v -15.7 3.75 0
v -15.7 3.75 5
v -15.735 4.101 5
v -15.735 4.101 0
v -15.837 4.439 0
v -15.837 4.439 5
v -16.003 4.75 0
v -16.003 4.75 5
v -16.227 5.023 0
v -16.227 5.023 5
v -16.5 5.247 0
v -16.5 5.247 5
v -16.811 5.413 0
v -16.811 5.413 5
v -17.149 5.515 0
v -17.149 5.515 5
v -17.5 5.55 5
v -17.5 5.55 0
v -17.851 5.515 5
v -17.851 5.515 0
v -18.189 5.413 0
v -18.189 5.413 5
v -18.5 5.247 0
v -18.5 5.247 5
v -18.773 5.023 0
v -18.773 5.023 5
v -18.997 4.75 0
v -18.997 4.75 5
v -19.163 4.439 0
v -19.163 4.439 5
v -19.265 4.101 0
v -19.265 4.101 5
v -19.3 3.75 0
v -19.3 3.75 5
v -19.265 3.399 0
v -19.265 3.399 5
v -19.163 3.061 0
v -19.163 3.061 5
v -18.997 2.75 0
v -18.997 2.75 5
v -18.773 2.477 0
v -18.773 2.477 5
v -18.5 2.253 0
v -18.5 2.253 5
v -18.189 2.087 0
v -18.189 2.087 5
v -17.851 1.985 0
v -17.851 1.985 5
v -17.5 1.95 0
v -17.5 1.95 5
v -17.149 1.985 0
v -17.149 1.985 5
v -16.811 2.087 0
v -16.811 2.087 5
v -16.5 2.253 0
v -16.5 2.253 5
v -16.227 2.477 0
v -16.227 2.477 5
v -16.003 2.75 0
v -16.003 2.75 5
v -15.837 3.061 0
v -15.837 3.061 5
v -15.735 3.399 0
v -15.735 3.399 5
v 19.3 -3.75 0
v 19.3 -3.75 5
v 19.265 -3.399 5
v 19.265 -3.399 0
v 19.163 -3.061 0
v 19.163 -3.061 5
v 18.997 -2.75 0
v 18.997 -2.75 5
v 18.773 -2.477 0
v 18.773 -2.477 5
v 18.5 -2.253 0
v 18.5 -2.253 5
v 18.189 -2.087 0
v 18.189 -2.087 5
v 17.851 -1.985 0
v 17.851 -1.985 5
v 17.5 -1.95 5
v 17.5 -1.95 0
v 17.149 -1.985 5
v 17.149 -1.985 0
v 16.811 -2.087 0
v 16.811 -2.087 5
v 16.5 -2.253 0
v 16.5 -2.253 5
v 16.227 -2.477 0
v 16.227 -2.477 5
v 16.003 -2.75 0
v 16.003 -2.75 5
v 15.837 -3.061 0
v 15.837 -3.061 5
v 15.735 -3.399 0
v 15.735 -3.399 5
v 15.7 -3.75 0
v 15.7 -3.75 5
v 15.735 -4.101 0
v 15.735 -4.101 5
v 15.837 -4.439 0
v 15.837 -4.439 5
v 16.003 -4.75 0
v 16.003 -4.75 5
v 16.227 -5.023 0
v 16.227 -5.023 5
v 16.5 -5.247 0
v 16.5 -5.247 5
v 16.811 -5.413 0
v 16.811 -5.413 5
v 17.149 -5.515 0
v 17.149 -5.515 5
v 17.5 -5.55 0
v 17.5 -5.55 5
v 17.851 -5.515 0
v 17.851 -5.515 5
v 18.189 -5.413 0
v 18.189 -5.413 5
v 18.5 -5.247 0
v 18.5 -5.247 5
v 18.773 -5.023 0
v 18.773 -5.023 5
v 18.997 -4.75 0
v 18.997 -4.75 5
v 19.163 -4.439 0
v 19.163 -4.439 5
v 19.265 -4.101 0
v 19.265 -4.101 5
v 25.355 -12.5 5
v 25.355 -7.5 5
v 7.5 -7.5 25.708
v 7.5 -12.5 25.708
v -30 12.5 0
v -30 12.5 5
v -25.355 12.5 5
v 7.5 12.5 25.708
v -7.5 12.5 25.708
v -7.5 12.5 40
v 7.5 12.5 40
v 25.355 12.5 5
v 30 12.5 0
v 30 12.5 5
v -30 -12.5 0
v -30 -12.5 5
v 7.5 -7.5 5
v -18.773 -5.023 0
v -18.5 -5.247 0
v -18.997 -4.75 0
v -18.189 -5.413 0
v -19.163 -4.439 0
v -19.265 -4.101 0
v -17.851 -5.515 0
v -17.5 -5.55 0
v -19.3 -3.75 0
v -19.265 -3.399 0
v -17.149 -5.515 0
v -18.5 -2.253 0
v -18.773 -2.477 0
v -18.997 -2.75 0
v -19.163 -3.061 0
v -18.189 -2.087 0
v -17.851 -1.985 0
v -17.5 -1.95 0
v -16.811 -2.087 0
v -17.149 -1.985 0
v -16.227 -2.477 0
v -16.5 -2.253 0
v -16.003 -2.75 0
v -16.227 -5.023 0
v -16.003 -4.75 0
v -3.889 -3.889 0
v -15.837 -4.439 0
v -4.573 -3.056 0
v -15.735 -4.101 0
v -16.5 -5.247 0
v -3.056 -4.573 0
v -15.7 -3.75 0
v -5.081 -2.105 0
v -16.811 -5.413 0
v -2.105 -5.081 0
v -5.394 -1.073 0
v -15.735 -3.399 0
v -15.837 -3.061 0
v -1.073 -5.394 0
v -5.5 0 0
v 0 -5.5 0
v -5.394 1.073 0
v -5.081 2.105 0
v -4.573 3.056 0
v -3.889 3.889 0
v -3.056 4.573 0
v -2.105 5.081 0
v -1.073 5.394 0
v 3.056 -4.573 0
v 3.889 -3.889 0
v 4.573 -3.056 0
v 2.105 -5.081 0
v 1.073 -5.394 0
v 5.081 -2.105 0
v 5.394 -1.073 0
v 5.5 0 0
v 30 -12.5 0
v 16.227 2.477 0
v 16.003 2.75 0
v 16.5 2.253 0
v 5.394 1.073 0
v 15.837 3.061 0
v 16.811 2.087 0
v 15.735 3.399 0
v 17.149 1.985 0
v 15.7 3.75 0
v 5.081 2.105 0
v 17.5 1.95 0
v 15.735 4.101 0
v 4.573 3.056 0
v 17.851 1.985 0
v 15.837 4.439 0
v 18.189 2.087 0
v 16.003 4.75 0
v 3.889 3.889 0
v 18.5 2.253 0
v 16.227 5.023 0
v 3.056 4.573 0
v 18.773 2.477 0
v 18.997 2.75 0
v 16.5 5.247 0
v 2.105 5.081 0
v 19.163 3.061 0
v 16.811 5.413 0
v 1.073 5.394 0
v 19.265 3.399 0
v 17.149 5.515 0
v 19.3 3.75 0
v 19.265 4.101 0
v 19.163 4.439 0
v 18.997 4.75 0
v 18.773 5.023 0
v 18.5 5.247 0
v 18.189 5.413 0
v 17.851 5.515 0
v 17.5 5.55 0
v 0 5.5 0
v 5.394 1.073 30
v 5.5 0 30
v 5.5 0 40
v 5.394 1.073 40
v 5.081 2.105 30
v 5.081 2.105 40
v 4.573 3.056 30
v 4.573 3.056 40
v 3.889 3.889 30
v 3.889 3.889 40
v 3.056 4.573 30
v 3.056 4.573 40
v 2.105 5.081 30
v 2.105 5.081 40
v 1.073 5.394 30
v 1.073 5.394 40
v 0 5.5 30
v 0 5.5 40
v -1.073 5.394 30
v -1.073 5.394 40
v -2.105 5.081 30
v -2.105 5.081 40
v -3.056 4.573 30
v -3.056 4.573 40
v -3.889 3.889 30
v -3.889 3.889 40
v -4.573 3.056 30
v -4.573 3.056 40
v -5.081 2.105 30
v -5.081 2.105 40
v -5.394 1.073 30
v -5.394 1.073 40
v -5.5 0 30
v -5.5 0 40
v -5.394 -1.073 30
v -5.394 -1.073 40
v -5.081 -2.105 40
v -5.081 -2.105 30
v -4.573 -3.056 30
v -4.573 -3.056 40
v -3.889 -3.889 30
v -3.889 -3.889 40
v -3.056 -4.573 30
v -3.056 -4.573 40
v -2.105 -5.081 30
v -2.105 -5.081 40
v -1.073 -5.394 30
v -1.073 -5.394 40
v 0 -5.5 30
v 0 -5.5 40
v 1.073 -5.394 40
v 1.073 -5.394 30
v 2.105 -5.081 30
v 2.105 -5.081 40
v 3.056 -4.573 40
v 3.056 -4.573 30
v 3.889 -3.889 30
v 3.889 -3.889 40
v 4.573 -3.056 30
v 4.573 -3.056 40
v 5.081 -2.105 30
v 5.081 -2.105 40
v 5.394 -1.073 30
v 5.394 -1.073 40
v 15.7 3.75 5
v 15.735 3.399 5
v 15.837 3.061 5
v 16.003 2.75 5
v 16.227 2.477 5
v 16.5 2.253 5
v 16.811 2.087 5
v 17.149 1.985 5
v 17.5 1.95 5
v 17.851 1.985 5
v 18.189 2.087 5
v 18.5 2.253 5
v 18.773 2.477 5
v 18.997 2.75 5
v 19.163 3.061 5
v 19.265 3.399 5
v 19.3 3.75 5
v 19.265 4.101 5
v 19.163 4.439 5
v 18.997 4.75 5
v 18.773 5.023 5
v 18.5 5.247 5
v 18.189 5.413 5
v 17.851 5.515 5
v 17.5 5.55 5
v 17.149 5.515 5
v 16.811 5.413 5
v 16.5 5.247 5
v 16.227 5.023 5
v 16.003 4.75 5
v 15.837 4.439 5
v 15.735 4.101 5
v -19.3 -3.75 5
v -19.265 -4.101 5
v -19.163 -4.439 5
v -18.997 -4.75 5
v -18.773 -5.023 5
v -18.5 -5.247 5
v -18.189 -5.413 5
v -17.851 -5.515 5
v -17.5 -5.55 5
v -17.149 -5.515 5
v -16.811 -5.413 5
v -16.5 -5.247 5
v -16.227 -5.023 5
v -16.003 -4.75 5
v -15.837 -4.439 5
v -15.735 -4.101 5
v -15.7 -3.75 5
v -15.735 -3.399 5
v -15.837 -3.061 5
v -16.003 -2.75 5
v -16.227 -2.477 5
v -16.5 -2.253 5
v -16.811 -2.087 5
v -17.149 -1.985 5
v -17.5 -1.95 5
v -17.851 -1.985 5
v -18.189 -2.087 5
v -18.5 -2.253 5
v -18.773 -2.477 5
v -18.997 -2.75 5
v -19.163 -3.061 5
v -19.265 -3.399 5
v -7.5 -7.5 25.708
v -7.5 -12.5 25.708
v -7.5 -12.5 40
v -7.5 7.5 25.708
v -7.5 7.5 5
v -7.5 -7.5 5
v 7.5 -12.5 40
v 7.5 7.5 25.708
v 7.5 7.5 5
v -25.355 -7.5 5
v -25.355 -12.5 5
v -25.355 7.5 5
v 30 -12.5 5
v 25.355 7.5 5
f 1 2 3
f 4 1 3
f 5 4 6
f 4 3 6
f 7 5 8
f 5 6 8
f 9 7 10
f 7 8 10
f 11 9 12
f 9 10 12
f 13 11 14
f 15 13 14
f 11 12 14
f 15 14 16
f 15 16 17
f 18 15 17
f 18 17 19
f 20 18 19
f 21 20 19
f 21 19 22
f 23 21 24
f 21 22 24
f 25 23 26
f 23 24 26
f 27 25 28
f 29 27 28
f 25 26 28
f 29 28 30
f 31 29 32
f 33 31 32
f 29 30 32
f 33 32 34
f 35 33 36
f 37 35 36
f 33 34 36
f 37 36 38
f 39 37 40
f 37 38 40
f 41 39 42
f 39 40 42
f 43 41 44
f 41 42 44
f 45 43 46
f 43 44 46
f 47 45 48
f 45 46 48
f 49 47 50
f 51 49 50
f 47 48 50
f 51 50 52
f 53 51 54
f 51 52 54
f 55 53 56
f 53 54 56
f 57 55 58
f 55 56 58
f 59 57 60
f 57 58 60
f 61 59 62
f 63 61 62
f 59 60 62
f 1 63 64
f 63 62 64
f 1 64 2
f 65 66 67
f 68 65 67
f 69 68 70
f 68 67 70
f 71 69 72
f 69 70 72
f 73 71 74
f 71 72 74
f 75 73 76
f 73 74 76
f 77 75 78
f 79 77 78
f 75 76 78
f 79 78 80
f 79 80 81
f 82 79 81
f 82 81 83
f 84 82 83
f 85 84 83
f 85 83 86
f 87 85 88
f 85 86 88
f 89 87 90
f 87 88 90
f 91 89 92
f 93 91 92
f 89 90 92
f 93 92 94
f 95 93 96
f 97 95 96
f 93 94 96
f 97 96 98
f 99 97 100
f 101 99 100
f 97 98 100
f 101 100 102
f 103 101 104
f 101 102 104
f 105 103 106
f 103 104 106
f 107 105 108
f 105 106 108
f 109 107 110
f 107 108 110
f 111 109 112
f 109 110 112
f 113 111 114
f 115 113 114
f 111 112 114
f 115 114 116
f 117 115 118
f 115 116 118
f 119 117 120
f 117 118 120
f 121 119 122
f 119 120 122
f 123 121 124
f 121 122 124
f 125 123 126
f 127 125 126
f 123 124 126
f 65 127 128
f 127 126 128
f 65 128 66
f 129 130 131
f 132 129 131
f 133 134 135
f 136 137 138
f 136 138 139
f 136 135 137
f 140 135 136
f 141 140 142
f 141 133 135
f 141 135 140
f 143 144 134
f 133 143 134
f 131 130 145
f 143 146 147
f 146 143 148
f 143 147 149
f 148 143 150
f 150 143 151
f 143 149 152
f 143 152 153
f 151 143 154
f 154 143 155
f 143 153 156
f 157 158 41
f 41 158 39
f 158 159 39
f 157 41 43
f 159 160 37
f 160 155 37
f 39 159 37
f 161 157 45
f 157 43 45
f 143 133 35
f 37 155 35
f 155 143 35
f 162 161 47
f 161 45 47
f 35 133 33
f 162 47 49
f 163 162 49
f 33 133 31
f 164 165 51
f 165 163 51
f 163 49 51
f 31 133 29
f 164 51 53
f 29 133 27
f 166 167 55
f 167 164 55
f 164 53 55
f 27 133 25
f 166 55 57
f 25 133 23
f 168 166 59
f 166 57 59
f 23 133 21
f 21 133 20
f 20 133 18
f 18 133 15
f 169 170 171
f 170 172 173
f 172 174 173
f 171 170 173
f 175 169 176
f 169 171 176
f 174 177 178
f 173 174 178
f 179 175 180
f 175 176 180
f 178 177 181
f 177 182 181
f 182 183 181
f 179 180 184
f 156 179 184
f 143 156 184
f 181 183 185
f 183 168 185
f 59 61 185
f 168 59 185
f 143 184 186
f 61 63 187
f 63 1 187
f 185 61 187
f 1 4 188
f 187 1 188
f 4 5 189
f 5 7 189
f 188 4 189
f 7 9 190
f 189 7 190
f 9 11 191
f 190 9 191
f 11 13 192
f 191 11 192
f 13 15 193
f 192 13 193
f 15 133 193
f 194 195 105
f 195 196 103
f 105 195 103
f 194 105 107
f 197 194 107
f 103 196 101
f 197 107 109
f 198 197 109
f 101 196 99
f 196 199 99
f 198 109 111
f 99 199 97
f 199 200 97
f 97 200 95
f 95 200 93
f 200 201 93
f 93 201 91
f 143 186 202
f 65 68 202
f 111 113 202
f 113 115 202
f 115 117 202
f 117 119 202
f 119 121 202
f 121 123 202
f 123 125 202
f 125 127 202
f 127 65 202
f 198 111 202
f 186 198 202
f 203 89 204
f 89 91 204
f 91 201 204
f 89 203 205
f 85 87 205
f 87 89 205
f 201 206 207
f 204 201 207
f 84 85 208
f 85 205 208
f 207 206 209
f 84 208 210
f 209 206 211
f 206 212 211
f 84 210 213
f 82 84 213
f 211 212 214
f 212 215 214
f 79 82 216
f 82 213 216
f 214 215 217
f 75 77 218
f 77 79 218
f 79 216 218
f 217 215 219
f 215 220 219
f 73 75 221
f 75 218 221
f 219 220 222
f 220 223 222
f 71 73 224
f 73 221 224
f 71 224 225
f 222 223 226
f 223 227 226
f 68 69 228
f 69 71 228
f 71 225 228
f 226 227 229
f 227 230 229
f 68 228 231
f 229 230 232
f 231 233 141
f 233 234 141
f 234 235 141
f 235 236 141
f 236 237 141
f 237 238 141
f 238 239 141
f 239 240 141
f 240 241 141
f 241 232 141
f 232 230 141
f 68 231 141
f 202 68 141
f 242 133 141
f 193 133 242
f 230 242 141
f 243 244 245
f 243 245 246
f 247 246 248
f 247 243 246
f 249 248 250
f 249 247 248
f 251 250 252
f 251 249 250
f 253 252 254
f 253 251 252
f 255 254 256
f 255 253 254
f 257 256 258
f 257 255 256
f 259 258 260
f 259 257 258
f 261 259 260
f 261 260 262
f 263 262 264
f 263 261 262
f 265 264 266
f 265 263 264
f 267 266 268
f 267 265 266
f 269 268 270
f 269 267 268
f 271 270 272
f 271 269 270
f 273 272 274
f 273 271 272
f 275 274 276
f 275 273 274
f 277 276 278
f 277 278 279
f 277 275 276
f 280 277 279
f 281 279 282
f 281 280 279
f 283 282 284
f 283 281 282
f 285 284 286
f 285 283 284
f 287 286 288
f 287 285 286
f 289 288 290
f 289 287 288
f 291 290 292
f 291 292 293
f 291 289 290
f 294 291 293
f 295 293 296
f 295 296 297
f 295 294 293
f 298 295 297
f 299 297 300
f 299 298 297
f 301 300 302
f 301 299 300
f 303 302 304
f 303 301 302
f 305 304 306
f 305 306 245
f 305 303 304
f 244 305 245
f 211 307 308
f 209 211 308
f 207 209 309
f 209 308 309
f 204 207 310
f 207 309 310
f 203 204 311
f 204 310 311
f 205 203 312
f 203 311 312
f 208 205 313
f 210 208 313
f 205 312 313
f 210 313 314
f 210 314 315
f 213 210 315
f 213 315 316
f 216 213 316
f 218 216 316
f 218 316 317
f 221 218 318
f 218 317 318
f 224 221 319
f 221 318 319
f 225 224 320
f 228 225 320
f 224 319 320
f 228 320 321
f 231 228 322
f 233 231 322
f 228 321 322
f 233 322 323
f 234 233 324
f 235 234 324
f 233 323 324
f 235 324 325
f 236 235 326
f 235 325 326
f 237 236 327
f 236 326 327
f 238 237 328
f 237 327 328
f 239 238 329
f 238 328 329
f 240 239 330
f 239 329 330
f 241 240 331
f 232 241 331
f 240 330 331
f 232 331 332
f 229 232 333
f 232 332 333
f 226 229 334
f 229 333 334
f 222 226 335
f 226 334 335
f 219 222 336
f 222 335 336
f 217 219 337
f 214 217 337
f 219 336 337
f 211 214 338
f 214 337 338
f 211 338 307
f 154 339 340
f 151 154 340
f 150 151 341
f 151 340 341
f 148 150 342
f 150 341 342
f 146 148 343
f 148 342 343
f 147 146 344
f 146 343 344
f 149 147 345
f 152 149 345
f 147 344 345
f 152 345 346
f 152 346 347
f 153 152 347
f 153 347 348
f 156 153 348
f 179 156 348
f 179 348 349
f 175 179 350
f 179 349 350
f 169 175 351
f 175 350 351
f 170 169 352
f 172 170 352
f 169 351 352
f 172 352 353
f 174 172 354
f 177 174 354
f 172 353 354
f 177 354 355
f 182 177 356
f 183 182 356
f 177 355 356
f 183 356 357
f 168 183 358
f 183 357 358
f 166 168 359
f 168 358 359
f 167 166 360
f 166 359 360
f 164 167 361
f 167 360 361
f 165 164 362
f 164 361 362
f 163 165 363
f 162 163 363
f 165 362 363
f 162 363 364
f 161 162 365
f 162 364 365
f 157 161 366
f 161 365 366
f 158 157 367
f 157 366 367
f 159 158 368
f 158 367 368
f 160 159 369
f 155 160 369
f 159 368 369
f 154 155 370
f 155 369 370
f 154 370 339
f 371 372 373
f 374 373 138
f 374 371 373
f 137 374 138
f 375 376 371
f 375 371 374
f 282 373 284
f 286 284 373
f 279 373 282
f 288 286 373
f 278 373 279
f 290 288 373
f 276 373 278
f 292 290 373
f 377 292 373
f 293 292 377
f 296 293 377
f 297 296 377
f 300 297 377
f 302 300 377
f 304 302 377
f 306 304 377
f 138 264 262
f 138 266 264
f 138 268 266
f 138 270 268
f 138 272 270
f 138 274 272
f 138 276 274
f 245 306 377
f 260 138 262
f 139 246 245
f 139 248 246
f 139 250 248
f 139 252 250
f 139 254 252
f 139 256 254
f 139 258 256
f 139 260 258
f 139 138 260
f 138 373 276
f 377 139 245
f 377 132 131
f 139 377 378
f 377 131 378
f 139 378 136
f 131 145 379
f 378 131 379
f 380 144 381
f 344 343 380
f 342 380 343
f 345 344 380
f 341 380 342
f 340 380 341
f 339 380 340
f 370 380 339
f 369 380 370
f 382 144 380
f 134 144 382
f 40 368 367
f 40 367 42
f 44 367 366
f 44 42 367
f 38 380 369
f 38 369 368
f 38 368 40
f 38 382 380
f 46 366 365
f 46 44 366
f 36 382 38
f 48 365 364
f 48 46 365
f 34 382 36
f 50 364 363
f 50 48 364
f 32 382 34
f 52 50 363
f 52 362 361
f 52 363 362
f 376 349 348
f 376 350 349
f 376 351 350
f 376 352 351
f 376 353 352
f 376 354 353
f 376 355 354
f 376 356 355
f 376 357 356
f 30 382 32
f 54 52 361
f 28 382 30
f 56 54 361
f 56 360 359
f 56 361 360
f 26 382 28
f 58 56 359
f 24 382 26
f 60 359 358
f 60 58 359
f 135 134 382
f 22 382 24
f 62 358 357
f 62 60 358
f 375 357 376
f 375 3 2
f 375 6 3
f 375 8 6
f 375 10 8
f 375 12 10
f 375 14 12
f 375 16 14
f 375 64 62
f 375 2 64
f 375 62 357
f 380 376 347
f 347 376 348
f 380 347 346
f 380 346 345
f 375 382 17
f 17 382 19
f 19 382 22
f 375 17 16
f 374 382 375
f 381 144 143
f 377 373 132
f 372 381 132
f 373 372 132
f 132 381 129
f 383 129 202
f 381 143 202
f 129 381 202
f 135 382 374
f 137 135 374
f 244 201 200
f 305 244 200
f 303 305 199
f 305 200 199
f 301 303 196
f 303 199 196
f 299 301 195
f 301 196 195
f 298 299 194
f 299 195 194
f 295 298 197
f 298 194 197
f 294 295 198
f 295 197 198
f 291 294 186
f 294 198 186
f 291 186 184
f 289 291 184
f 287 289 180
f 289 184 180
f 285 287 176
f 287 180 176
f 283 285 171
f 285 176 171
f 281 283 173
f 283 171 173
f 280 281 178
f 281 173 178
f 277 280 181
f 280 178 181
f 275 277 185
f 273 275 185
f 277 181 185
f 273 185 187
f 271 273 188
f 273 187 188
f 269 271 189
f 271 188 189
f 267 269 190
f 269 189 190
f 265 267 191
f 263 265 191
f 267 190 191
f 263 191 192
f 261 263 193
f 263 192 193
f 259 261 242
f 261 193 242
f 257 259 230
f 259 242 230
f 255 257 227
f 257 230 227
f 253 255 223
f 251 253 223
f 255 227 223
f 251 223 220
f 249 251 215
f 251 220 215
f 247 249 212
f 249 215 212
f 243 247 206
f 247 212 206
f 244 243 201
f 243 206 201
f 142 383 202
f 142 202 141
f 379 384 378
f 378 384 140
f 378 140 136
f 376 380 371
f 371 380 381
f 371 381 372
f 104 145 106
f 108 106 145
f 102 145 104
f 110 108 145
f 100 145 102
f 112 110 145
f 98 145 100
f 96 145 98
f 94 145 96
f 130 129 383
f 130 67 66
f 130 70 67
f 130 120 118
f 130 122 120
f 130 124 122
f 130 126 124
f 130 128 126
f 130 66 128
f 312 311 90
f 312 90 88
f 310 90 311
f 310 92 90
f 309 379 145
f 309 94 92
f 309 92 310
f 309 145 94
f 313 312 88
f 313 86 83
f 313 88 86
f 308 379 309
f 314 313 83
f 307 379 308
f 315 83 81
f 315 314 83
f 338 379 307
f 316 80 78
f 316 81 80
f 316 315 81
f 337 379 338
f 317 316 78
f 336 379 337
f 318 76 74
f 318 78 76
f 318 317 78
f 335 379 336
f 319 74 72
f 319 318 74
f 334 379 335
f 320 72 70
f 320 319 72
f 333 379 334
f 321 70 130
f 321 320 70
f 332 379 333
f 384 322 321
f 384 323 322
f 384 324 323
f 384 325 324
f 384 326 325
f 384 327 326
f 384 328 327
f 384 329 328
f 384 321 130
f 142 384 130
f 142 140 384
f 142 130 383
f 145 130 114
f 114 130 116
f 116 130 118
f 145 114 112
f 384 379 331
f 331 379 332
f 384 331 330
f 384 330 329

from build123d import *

# Parameters (mm, degrees)
SKETCH_1_W               = 40
SKETCH_1_H               = 15
EXTRUDE_1_DEPTH          = 5
SKETCH_2_R               = 5.5
SKETCH_2_R_2             = 1.8
CUT_EXTRUDE_1_DEPTH      = 5
SKETCH_3_W               = 15
SKETCH_3_H               = 15
SKETCH_3_R               = 5.05
EXTRUDE_2_DEPTH          = 25
SKETCH_4_R               = 5.5
CUT_EXTRUDE_2_DEPTH      = 31
SKETCH_5_W               = 10
SKETCH_5_H               = 15
EXTRUDE_3_DEPTH          = 5
SKETCH_6_R               = 1.8
CUT_EXTRUDE_3_DEPTH      = 5
SKETCH_7_W               = 60
SKETCH_7_H               = 5
EXTRUDE_4_DEPTH          = 5
SKETCH_8_W               = 15
SKETCH_8_H               = 5
EXTRUDE_5_DEPTH          = 25
RIB_1_REACH              = 51.244
SKETCH_9_WALL_W          = 127.83111072
SKETCH_9_WALL_H          = 5
MIRROR_2_COPY_1_REACH    = 51.244
MIRROR_2_COPY_1_SKETCH_W = 127.83111072
MIRROR_2_COPY_1_SKETCH_H = 5
SKETCH_11_R              = 1.8
EXTRUDE_6_DEPTH          = 5
SKETCH_12_R              = 1.8
CUT_EXTRUDE_4_DEPTH      = 5
SKETCH_13_W              = 15
SKETCH_13_H              = 25
SKETCH_13_R              = 5.5
EXTRUDE_7_DEPTH          = 10


with BuildPart() as part:
    # 草图1 → 凸台-拉伸1 (new body)
    with BuildSketch(Plane.XY):
        Rectangle(SKETCH_1_W, SKETCH_1_H)
    extrude(amount=EXTRUDE_1_DEPTH)

    # 草图2 → 切除-拉伸1 (cut)
    with BuildSketch(Plane.XY.offset(5)):
        Circle(SKETCH_2_R)
        with Locations((-12, 0)):
            Circle(SKETCH_2_R_2)
        with Locations(Location((12, 0, 0), (0, 0, 180))):
            Circle(SKETCH_2_R_2)
    extrude(amount=-CUT_EXTRUDE_1_DEPTH, mode=Mode.SUBTRACT)

    # 草图3 → 凸台-拉伸2 (add)
    with BuildSketch(Plane.XY.offset(5)):
        Rectangle(SKETCH_3_W, SKETCH_3_H)
        Circle(SKETCH_3_R, mode=Mode.SUBTRACT)
    extrude(amount=EXTRUDE_2_DEPTH)

    # 草图4 → 切除-拉伸2 (cut)
    with BuildSketch(Plane(origin=(0, 0, 5), x_dir=(-1, 0, 0), z_dir=(0, 0, -1))):
        with Locations(Location((0, 0, 0), (0, 0, 180))):
            Circle(SKETCH_4_R)
    extrude(amount=-CUT_EXTRUDE_2_DEPTH, mode=Mode.SUBTRACT)

    # 草图5 → 凸台-拉伸3 (add)
    with BuildSketch(Plane.XY.offset(5)):
        with Locations((-25, 0)):
            Rectangle(SKETCH_5_W, SKETCH_5_H)
        with Locations((25, 0)):
            Rectangle(SKETCH_5_W, SKETCH_5_H)
    extrude(amount=-EXTRUDE_3_DEPTH)

    # 草图6 → 切除-拉伸3 (cut)
    with BuildSketch(Plane.XY.offset(5)):
        with Locations((-24, 0)):
            Circle(SKETCH_6_R)
        with Locations(Location((24, 0, 0), (0, 0, 180))):
            Circle(SKETCH_6_R)
    extrude(amount=-CUT_EXTRUDE_3_DEPTH, mode=Mode.SUBTRACT)

    # 草图7 → 凸台-拉伸4 (add)
    with BuildSketch(Plane.XY.offset(5)):
        with Locations((0, 10)):
            Rectangle(SKETCH_7_W, SKETCH_7_H)
        with Locations((0, -10)):
            Rectangle(SKETCH_7_W, SKETCH_7_H)
    extrude(amount=-EXTRUDE_4_DEPTH)

    # 草图8 → 凸台-拉伸5 (add)
    with BuildSketch(Plane.XY.offset(5)):
        with Locations((0, 10)):
            Rectangle(SKETCH_8_W, SKETCH_8_H)
        with Locations((0, -10)):
            Rectangle(SKETCH_8_W, SKETCH_8_H)
    extrude(amount=EXTRUDE_5_DEPTH)

    # 草图9 wall → 筋1 (add, up to next)
    with BuildSketch(Plane(origin=(-16.427615827, 12.5, 15.353801199), x_dir=(0.653020400469, 0, 0.75734031754), z_dir=(0.75734031754, 0, -0.653020400469)), mode=Mode.PRIVATE) as rib_1_sk1:
        with Locations((0, 2.5)):
            Rectangle(SKETCH_9_WALL_W, SKETCH_9_WALL_H)
    rib_1_tool1 = extrude(rib_1_sk1.sketch, amount=RIB_1_REACH, mode=Mode.PRIVATE) - part.part
    rib_1 = rib_1_tool1.solids().sort_by_distance((-16.427615827, 12.5, 15.353801199))[0]
    add(rib_1)

    # 镜向1: 筋1 across plane
    add(rib_1.mirror(Plane.ZX))

    # 镜向2: 筋1 across plane
    add(rib_1.mirror(Plane.ZY))

    # 镜向2 copy 1 sketch → 镜向2 copy 1 (add, up to next)
    with BuildSketch(Plane(origin=(16.427615827, -12.5, 15.353801199), x_dir=(-0.653020400469, 0, 0.75734031754), z_dir=(-0.75734031754, 0, -0.653020400469)), mode=Mode.PRIVATE) as mirror_2_copy_1_sk1:
        with Locations((0, 2.5)):
            Rectangle(MIRROR_2_COPY_1_SKETCH_W, MIRROR_2_COPY_1_SKETCH_H)
    mirror_2_copy_1_tool1 = extrude(mirror_2_copy_1_sk1.sketch, amount=MIRROR_2_COPY_1_REACH, mode=Mode.PRIVATE) - part.part
    add(mirror_2_copy_1_tool1.solids().sort_by_distance((16.427615827, -12.5, 15.353801199))[0])

    # 草图11 → 凸台-拉伸6 (add)
    with BuildSketch(Plane.XY.offset(5)):
        with Locations((-24, 0)):
            Circle(SKETCH_11_R)
        with Locations((-12, 0)):
            Circle(SKETCH_11_R)
        with Locations((12, 0)):
            Circle(SKETCH_11_R)
        with Locations((24, 0)):
            Circle(SKETCH_11_R)
    extrude(amount=-EXTRUDE_6_DEPTH)

    # 草图12 → 切除-拉伸4 (cut)
    with BuildSketch(Plane.XY.offset(5)):
        with Locations((-17.5, 3.75)):
            Circle(SKETCH_12_R)
        with Locations(Location((-17.5, -3.75, 0), (0, 0, 180))):
            Circle(SKETCH_12_R)
        with Locations((17.5, -3.75)):
            Circle(SKETCH_12_R)
        with Locations(Location((17.5, 3.75, 0), (0, 0, 180))):
            Circle(SKETCH_12_R)
    extrude(amount=-CUT_EXTRUDE_4_DEPTH, mode=Mode.SUBTRACT)

    # 草图13 → 凸台-拉伸7 (add)
    with BuildSketch(Plane.XY.offset(30)):
        Rectangle(SKETCH_13_W, SKETCH_13_H)
        Circle(SKETCH_13_R, mode=Mode.SUBTRACT)
    extrude(amount=EXTRUDE_7_DEPTH)


solid = part.part
